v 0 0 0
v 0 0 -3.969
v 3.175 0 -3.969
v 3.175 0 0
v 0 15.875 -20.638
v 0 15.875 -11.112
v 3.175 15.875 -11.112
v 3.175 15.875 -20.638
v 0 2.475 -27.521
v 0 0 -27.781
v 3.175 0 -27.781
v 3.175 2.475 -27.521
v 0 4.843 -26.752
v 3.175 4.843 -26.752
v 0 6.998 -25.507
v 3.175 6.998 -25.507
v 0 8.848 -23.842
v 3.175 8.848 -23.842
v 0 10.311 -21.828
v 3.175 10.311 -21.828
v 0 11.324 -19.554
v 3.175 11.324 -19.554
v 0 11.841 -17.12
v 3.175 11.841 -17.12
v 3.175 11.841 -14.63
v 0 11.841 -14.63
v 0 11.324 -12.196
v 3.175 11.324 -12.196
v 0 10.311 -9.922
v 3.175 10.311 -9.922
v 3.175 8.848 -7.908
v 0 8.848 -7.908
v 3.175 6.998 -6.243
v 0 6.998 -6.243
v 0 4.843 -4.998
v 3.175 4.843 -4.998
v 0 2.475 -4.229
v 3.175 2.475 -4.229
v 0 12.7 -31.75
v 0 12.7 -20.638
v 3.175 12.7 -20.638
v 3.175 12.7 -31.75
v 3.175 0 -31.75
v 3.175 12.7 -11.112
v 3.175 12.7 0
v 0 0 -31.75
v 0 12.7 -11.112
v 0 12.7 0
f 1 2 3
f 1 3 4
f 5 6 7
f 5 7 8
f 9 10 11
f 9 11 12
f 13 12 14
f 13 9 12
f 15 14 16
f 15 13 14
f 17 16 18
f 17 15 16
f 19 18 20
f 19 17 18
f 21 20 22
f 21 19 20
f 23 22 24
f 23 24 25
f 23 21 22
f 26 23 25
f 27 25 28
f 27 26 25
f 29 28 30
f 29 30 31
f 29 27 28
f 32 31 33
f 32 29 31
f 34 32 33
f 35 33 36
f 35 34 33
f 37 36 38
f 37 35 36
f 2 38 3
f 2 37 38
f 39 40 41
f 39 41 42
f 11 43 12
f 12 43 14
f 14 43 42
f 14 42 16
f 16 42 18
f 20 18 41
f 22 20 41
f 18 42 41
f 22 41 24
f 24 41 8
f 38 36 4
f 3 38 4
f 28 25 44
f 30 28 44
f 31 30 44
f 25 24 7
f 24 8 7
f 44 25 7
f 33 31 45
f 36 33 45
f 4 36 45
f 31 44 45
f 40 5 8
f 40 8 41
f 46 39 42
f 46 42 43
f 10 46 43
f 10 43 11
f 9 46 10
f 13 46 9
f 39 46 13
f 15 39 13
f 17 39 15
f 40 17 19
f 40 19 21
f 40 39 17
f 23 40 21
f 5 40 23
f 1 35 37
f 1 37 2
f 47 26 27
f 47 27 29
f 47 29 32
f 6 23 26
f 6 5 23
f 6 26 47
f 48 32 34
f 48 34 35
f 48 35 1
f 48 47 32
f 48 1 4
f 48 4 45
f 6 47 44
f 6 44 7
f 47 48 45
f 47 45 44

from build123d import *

# Parameters (mm, degrees)
BOSS_EXTRUDE1_DEPTH = 3.175


with BuildPart() as part:
    # Sketch1 → Boss-Extrude1 (new body)
    with BuildSketch(Plane(origin=(0, 0, 0), x_dir=(0, 0, -1), z_dir=(1, 0, 0))):
        with BuildLine():
            Line((11.1125, 12.7), (11.1125, 15.875))
            Line((11.1125, 15.875), (20.6375, 15.875))
            Line((20.6375, 15.875), (20.6375, 12.7))
            Line((20.6375, 12.7), (31.75, 12.7))
            Line((31.75, 12.7), (31.75, 0))
            Line((31.75, 0), (27.78125, 0))
            ThreePointArc((27.78125, 0), (15.875, 11.90625), (3.96875, 0))
            Line((3.96875, 0), (0, 0))
            Line((0, 0), (0, 12.7))
            Line((0, 12.7), (11.1125, 12.7))
        make_face()
    extrude(amount=BOSS_EXTRUDE1_DEPTH)


solid = part.part
